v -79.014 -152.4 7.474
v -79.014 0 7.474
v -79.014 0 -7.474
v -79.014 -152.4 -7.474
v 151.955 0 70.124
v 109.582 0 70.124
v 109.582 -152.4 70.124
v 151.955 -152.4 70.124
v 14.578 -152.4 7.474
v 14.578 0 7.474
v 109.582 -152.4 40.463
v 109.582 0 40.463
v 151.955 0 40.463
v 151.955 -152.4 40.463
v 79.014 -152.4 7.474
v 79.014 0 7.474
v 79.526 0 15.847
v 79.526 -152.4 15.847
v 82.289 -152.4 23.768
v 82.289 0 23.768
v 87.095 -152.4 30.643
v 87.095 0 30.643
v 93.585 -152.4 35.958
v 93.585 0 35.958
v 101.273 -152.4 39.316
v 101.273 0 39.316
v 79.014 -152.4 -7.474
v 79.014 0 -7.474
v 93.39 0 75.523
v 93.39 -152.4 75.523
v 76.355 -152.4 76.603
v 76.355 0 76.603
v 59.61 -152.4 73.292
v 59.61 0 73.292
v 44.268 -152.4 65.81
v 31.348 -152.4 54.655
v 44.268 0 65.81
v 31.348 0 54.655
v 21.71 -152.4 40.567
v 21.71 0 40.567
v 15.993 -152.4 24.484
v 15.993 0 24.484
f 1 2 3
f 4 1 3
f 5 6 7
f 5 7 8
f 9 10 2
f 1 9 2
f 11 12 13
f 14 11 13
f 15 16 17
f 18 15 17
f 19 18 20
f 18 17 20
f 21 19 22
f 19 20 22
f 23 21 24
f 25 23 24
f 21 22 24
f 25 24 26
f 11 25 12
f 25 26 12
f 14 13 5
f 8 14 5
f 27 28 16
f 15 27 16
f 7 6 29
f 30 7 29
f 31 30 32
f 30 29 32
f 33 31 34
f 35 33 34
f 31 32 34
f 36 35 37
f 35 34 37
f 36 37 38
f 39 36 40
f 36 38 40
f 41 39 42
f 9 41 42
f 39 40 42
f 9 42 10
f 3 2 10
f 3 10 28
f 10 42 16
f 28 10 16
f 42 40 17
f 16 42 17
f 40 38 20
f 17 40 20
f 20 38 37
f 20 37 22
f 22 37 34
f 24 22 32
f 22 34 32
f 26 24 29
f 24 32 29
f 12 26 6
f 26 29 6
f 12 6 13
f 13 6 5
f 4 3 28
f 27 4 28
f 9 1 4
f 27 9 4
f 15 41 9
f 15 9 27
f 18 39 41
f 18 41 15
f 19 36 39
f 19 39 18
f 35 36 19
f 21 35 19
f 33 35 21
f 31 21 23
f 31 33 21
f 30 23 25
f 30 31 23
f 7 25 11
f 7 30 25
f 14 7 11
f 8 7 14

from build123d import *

# Parameters (mm, degrees)
F0_W     = 42.372167
F0_H     = 29.660501
F1_DEPTH = 152.4


with BuildPart() as f1:
    # F0 (on Front) → F1 (new body)
    with BuildSketch(Plane.XZ):
        with BuildLine():
            ThreePointArc((109.582473, 70.123763), (44.267725, 65.810023), (14.578056, 7.473514))
            Line((14.578056, 7.473514), (79.013996, 7.473514))
            ThreePointArc((79.013996, 7.473514), (87.094947, 30.642993), (109.582473, 40.463262))
            Line((109.582473, 40.463262), (109.582473, 70.123763))
        make_face()
        Polygon((14.578056, 7.473514), (-79.013996, 7.473514), (-79.013996, -7.473514), (79.013996, -7.473514), (79.013996, 7.473514), align=None)
        with Locations((130.768556, 55.293512)):
            Rectangle(F0_W, F0_H)
    extrude(amount=F1_DEPTH)


solid = f1.part
